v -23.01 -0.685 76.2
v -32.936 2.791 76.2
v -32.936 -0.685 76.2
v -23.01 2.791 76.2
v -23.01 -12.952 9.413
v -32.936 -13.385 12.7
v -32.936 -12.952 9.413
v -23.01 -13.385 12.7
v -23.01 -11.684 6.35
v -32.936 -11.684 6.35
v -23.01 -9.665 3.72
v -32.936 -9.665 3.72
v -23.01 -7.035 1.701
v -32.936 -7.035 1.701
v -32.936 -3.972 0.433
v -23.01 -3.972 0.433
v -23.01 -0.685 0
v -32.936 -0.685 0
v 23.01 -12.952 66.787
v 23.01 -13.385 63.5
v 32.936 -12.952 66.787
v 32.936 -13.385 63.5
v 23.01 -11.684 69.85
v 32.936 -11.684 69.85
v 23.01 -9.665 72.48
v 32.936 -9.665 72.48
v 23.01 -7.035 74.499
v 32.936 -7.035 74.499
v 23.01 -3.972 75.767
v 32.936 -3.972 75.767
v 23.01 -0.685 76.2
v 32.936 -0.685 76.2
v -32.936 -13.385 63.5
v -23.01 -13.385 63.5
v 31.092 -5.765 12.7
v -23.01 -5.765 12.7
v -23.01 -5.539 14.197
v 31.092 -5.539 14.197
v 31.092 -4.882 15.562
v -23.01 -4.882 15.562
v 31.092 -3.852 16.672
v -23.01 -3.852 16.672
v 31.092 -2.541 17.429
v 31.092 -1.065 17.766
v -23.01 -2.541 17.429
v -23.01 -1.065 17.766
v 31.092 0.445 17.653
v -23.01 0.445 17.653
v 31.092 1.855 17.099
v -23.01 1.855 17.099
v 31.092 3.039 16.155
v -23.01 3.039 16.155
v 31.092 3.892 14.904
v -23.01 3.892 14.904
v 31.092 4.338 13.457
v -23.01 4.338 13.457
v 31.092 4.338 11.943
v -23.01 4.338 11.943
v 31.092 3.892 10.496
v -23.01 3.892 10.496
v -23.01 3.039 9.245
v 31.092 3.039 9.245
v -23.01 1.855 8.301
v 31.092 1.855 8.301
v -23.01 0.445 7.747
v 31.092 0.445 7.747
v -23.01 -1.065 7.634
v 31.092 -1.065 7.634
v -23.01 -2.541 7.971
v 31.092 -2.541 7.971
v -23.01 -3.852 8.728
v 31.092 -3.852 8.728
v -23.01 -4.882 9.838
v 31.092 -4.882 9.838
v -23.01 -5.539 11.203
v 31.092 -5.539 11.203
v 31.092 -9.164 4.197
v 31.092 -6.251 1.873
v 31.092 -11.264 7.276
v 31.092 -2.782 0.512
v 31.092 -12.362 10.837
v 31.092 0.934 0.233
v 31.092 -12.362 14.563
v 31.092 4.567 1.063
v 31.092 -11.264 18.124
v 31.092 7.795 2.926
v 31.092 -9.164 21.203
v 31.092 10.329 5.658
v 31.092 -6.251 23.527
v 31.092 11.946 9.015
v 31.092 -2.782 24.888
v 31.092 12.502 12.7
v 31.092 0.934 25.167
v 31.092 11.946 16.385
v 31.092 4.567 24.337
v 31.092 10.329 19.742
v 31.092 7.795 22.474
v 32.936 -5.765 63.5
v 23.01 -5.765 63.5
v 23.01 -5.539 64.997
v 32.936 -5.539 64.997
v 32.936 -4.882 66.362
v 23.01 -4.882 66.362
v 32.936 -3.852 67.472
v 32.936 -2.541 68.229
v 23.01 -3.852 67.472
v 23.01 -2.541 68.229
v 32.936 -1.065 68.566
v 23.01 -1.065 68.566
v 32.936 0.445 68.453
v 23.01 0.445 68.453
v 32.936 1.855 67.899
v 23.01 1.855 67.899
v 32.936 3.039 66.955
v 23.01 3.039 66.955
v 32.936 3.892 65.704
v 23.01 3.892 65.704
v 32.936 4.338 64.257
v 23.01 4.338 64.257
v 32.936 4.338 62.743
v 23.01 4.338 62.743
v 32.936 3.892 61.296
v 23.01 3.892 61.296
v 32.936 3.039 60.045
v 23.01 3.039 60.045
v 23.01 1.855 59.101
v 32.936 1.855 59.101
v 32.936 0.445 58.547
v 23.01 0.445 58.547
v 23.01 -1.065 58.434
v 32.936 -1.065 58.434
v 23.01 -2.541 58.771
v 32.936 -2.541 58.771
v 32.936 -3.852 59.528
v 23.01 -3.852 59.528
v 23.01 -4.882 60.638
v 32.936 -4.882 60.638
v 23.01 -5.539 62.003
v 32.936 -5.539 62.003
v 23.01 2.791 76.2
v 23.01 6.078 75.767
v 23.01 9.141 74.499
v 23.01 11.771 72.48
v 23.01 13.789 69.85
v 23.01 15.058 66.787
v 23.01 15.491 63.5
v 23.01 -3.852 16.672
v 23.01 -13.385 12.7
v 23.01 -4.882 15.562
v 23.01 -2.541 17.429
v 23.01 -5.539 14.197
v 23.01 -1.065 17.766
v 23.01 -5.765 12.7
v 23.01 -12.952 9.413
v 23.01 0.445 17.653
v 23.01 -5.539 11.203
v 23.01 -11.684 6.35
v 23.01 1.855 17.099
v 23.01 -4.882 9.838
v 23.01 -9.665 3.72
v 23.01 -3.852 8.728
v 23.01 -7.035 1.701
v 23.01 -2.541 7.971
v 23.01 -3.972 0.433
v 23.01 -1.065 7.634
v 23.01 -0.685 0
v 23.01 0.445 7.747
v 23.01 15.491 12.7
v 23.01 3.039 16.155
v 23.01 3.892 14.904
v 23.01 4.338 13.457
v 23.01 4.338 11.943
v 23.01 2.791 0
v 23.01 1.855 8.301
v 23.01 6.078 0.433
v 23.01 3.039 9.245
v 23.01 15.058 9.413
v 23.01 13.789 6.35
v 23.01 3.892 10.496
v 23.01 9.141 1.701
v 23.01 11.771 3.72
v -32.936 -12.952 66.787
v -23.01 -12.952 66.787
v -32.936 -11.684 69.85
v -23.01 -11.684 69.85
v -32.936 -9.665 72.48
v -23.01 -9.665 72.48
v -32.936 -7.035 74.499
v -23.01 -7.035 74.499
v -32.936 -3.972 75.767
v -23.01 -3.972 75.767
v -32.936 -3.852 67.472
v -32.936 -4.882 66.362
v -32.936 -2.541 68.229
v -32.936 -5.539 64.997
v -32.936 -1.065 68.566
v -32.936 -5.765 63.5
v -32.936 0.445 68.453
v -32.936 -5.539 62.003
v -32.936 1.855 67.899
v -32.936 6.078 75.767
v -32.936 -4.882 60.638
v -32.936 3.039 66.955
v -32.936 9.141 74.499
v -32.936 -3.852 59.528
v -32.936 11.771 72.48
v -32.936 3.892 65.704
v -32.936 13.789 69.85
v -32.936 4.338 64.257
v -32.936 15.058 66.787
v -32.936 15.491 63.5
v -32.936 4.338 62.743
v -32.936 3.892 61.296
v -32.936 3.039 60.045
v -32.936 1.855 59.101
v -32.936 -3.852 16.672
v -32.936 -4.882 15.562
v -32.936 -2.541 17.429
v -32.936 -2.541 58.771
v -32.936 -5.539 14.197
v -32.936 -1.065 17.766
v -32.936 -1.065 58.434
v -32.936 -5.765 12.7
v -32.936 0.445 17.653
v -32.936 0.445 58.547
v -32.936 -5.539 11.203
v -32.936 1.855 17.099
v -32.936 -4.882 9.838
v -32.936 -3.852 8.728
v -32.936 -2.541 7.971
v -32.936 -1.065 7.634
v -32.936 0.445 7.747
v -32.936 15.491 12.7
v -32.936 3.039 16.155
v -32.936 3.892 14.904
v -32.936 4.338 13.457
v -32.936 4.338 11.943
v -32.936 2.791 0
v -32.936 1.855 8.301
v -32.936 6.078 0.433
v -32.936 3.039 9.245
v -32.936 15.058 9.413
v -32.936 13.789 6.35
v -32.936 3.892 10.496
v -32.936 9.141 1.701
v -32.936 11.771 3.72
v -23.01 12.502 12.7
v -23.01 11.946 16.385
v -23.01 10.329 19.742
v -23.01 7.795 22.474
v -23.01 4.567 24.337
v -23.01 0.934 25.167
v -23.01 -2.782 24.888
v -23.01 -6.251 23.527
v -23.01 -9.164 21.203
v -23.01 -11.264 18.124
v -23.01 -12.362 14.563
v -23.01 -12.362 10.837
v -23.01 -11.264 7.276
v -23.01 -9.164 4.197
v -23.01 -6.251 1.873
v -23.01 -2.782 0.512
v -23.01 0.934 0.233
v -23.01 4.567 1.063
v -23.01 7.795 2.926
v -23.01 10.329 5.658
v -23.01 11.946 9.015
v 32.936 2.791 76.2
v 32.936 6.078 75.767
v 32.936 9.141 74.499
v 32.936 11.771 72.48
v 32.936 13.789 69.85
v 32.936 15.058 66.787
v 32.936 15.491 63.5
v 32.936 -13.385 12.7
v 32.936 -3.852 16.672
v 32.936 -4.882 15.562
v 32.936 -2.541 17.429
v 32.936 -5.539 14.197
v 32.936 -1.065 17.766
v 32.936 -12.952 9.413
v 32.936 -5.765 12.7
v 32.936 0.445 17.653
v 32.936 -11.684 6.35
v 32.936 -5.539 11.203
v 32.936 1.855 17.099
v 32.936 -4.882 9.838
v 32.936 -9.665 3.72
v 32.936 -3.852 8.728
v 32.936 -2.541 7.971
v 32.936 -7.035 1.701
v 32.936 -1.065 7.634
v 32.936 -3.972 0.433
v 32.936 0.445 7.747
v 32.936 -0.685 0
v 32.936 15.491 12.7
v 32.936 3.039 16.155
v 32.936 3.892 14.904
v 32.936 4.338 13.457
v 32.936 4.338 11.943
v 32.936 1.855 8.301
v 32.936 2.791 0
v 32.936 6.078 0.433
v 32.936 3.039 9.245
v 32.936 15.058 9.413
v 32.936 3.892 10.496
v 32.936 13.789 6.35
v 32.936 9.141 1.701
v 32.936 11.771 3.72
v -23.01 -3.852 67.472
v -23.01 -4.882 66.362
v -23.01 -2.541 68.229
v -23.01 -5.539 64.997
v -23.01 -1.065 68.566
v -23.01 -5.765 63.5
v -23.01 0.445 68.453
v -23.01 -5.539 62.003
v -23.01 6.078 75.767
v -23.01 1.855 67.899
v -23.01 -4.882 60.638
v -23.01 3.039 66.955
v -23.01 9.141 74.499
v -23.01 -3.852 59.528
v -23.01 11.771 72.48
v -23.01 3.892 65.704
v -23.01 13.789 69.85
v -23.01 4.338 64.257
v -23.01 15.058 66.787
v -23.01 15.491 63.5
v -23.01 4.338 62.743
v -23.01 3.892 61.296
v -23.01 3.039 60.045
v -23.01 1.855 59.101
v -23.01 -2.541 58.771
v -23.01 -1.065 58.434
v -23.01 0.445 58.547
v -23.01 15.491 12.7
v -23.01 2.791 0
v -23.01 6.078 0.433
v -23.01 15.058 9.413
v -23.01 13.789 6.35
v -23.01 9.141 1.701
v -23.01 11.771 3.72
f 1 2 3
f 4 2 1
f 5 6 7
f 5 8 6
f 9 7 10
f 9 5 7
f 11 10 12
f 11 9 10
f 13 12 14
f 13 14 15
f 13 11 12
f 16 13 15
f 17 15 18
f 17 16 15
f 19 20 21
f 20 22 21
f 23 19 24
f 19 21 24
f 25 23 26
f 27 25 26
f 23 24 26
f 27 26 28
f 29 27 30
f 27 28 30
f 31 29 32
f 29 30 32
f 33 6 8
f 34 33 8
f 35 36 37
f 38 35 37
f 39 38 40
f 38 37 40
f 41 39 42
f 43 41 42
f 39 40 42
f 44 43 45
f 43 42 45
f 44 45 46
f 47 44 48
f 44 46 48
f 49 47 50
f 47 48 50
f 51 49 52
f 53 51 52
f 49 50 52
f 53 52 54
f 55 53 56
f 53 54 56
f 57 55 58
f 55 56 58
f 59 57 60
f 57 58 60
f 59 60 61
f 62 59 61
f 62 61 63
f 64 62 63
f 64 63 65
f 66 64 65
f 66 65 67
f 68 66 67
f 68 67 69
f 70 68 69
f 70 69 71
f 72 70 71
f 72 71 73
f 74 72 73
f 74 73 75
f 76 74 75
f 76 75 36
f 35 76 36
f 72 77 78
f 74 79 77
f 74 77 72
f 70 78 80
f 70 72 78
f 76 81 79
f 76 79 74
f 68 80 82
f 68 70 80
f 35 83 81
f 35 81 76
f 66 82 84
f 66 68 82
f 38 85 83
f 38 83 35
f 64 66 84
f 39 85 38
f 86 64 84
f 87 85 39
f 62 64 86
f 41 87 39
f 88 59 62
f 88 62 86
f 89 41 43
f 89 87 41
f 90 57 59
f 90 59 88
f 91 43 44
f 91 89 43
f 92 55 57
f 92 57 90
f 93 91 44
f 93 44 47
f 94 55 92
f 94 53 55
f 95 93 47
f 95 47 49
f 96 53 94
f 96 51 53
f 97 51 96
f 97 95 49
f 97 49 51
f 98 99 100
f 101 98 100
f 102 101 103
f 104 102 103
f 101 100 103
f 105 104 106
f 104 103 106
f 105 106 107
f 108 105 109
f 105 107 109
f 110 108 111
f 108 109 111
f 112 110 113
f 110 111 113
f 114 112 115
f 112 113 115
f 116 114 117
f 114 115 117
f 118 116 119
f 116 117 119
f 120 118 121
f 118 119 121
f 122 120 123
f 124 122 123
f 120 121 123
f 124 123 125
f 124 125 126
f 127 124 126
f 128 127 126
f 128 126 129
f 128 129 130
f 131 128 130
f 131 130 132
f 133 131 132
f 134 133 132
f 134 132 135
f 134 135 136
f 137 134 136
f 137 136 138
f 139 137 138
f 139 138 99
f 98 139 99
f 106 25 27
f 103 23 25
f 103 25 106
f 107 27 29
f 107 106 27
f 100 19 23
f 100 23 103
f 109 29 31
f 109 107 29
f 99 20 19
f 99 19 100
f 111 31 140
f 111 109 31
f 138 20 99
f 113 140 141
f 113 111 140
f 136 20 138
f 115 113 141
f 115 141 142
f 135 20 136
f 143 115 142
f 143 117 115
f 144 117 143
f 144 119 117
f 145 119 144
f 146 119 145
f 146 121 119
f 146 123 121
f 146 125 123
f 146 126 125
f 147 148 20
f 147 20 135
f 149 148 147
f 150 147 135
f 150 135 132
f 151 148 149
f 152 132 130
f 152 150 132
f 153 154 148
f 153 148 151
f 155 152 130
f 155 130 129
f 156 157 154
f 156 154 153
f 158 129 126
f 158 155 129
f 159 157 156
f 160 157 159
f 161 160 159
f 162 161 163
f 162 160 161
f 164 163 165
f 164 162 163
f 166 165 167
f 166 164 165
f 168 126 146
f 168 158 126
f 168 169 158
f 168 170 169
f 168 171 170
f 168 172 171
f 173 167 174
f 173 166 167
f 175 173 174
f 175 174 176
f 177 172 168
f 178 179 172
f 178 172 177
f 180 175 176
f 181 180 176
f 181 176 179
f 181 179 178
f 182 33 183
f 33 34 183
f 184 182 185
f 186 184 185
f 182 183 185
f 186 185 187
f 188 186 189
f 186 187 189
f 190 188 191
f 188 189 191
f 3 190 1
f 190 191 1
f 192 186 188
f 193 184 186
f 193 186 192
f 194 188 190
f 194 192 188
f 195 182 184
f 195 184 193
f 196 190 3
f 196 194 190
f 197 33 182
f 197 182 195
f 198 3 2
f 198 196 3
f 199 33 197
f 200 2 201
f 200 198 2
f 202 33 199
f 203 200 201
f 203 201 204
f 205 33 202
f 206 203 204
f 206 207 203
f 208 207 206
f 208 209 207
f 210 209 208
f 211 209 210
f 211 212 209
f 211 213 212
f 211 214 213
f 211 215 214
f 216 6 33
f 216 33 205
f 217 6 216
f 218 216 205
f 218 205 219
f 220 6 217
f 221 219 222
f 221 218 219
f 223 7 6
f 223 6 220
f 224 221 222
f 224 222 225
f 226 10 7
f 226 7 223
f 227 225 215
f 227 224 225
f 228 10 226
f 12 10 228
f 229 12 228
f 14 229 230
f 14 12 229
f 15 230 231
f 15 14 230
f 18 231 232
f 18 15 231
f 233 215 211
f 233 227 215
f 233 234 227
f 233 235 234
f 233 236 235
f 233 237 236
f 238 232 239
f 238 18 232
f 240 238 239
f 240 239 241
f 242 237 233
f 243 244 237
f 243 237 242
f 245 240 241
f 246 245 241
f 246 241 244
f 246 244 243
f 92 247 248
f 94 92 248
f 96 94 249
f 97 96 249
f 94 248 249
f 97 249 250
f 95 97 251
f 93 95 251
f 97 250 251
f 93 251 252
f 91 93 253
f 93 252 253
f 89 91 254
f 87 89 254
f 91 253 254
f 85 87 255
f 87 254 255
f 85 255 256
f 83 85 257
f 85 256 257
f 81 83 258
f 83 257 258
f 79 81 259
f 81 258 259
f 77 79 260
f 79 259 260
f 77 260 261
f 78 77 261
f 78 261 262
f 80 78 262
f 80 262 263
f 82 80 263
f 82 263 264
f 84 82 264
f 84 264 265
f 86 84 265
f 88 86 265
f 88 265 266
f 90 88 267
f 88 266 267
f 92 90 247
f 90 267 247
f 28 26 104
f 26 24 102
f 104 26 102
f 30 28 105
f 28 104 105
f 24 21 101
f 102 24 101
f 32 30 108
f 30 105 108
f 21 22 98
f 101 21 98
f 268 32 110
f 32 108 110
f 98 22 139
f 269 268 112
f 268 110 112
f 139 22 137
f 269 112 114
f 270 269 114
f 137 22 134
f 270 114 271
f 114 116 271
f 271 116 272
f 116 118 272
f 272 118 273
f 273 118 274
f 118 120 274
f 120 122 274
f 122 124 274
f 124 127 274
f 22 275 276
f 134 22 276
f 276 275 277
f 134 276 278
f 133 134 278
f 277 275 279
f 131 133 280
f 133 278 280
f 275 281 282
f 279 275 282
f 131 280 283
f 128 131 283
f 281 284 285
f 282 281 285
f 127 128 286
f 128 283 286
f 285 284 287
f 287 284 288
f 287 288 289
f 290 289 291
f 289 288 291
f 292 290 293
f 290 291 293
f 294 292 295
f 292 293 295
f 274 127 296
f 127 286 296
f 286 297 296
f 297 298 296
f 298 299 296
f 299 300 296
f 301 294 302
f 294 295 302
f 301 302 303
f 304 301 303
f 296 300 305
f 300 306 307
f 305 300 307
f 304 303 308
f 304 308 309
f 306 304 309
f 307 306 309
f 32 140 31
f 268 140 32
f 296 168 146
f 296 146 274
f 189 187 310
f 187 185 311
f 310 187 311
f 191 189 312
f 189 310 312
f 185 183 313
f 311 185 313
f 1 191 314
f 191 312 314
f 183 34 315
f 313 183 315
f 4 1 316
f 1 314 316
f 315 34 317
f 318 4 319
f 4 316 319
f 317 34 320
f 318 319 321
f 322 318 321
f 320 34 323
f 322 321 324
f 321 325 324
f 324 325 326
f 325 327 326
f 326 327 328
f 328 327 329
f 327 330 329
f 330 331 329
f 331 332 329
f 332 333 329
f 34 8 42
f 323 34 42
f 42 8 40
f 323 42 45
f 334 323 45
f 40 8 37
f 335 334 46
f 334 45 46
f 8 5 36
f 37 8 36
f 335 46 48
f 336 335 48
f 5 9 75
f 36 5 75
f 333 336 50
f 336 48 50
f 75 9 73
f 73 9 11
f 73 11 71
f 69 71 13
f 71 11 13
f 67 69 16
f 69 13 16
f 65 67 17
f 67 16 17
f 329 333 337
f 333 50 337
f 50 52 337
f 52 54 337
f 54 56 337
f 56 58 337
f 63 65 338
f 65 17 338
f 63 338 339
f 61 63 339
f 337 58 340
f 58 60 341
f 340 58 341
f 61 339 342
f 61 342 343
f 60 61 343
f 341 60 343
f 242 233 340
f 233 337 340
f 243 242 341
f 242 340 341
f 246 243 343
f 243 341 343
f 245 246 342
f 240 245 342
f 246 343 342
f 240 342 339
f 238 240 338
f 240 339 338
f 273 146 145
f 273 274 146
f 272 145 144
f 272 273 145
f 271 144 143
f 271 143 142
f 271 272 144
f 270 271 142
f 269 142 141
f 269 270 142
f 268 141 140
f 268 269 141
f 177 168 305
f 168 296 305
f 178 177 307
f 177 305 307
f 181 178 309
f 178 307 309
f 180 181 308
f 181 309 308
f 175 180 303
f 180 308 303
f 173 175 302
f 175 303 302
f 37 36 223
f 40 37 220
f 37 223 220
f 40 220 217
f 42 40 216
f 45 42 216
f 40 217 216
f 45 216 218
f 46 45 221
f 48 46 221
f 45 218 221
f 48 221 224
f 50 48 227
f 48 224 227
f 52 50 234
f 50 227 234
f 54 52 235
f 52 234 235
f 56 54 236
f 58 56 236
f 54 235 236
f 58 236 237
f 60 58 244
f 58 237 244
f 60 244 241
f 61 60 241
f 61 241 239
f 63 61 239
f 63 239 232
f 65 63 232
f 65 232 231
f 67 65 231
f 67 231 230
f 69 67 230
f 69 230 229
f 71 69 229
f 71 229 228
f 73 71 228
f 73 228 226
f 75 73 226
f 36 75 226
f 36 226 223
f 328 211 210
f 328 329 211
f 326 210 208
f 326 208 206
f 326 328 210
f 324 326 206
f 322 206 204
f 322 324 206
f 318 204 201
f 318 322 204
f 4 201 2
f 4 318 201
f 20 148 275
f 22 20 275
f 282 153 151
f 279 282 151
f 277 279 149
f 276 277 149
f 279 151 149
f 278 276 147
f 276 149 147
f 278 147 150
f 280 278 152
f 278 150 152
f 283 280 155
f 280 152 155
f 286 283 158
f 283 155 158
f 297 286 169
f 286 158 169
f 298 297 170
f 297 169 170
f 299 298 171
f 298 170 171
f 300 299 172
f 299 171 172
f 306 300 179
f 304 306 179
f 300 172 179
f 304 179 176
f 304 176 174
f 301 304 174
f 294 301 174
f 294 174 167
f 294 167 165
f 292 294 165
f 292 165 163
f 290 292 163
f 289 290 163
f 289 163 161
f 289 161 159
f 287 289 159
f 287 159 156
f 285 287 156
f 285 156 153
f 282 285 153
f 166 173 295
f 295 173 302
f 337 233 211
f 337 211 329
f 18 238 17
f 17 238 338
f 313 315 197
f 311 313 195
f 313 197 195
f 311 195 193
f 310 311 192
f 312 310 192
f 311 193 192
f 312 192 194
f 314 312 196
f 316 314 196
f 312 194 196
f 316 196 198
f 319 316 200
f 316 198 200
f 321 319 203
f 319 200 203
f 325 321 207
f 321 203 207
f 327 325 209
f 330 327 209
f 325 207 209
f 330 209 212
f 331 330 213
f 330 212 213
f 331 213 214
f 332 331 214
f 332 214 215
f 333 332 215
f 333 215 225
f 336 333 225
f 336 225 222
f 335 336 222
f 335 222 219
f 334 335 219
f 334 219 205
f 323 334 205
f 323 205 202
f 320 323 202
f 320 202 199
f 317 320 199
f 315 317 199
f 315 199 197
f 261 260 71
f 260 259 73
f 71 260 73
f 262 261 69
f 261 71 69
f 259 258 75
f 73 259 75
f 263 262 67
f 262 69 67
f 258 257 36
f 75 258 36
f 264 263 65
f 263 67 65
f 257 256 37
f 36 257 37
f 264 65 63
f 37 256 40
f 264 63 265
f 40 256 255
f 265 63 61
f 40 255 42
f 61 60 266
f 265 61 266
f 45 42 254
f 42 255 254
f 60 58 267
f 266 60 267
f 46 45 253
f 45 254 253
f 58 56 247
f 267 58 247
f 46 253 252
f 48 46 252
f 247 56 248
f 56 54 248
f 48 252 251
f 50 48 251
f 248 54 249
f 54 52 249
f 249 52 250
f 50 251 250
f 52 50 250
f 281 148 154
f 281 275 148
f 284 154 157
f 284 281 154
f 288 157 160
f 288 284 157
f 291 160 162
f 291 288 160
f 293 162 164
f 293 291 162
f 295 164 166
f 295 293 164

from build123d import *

# Parameters (mm, degrees)
F0_W     = 9.926051
F0_H     = 28.875791
F1_DEPTH = 76.2
F2_R     = 12.7
F3_R     = 12.501613
F4_DEPTH = 54.102
F6_D     = 10.16
F6_2_D   = 10.16


with BuildPart() as f1:
    # F0 (on Top) → F1 (new body)
    with BuildSketch(Plane.XY):
        with Locations((-27.97342, 1.052764)):
            Rectangle(F0_W, F0_H)
        with Locations((27.97342, 1.052764)):
            Rectangle(F0_W, F0_H)
    extrude(amount=F1_DEPTH)

    # F2
    f2_edges = [f1.edges().sort_by_distance(p)[0] for p in [
        (-27.973421, 15.490659, 76.2),
        (-27.973421, -13.385132, 76.2),
        (27.973421, 15.490659, 76.2),
        (27.973421, -13.385132, 76.2),
        (27.973421, -13.385132, 0),
        (-27.973421, -13.385132, 0),
        (-27.973421, 15.490659, 0),
        (27.973421, 15.490659, 0),
    ]]
    fillet(f2_edges, radius=F2_R)

    # F6 (through all)
    with Locations(Plane.YZ.offset(32.936446)):
        with Locations((-0.685132, 12.7), (-0.685132, 63.5)):
            Hole(F6_D / 2)


with BuildPart() as f4:
    # F3 (on face) → F4 (new body)
    with BuildSketch(Plane.YZ.offset(-23.010395)):
        with Locations((0, 12.7)):
            Circle(F3_R)
    extrude(amount=F4_DEPTH)

    # F6#2 (through all)
    with Locations(Plane.YZ.offset(32.936446)):
        with Locations((-0.685132, 12.7), (-0.685132, 63.5)):
            Hole(F6_2_D / 2)


solid = Compound([f1.part, f4.part])
